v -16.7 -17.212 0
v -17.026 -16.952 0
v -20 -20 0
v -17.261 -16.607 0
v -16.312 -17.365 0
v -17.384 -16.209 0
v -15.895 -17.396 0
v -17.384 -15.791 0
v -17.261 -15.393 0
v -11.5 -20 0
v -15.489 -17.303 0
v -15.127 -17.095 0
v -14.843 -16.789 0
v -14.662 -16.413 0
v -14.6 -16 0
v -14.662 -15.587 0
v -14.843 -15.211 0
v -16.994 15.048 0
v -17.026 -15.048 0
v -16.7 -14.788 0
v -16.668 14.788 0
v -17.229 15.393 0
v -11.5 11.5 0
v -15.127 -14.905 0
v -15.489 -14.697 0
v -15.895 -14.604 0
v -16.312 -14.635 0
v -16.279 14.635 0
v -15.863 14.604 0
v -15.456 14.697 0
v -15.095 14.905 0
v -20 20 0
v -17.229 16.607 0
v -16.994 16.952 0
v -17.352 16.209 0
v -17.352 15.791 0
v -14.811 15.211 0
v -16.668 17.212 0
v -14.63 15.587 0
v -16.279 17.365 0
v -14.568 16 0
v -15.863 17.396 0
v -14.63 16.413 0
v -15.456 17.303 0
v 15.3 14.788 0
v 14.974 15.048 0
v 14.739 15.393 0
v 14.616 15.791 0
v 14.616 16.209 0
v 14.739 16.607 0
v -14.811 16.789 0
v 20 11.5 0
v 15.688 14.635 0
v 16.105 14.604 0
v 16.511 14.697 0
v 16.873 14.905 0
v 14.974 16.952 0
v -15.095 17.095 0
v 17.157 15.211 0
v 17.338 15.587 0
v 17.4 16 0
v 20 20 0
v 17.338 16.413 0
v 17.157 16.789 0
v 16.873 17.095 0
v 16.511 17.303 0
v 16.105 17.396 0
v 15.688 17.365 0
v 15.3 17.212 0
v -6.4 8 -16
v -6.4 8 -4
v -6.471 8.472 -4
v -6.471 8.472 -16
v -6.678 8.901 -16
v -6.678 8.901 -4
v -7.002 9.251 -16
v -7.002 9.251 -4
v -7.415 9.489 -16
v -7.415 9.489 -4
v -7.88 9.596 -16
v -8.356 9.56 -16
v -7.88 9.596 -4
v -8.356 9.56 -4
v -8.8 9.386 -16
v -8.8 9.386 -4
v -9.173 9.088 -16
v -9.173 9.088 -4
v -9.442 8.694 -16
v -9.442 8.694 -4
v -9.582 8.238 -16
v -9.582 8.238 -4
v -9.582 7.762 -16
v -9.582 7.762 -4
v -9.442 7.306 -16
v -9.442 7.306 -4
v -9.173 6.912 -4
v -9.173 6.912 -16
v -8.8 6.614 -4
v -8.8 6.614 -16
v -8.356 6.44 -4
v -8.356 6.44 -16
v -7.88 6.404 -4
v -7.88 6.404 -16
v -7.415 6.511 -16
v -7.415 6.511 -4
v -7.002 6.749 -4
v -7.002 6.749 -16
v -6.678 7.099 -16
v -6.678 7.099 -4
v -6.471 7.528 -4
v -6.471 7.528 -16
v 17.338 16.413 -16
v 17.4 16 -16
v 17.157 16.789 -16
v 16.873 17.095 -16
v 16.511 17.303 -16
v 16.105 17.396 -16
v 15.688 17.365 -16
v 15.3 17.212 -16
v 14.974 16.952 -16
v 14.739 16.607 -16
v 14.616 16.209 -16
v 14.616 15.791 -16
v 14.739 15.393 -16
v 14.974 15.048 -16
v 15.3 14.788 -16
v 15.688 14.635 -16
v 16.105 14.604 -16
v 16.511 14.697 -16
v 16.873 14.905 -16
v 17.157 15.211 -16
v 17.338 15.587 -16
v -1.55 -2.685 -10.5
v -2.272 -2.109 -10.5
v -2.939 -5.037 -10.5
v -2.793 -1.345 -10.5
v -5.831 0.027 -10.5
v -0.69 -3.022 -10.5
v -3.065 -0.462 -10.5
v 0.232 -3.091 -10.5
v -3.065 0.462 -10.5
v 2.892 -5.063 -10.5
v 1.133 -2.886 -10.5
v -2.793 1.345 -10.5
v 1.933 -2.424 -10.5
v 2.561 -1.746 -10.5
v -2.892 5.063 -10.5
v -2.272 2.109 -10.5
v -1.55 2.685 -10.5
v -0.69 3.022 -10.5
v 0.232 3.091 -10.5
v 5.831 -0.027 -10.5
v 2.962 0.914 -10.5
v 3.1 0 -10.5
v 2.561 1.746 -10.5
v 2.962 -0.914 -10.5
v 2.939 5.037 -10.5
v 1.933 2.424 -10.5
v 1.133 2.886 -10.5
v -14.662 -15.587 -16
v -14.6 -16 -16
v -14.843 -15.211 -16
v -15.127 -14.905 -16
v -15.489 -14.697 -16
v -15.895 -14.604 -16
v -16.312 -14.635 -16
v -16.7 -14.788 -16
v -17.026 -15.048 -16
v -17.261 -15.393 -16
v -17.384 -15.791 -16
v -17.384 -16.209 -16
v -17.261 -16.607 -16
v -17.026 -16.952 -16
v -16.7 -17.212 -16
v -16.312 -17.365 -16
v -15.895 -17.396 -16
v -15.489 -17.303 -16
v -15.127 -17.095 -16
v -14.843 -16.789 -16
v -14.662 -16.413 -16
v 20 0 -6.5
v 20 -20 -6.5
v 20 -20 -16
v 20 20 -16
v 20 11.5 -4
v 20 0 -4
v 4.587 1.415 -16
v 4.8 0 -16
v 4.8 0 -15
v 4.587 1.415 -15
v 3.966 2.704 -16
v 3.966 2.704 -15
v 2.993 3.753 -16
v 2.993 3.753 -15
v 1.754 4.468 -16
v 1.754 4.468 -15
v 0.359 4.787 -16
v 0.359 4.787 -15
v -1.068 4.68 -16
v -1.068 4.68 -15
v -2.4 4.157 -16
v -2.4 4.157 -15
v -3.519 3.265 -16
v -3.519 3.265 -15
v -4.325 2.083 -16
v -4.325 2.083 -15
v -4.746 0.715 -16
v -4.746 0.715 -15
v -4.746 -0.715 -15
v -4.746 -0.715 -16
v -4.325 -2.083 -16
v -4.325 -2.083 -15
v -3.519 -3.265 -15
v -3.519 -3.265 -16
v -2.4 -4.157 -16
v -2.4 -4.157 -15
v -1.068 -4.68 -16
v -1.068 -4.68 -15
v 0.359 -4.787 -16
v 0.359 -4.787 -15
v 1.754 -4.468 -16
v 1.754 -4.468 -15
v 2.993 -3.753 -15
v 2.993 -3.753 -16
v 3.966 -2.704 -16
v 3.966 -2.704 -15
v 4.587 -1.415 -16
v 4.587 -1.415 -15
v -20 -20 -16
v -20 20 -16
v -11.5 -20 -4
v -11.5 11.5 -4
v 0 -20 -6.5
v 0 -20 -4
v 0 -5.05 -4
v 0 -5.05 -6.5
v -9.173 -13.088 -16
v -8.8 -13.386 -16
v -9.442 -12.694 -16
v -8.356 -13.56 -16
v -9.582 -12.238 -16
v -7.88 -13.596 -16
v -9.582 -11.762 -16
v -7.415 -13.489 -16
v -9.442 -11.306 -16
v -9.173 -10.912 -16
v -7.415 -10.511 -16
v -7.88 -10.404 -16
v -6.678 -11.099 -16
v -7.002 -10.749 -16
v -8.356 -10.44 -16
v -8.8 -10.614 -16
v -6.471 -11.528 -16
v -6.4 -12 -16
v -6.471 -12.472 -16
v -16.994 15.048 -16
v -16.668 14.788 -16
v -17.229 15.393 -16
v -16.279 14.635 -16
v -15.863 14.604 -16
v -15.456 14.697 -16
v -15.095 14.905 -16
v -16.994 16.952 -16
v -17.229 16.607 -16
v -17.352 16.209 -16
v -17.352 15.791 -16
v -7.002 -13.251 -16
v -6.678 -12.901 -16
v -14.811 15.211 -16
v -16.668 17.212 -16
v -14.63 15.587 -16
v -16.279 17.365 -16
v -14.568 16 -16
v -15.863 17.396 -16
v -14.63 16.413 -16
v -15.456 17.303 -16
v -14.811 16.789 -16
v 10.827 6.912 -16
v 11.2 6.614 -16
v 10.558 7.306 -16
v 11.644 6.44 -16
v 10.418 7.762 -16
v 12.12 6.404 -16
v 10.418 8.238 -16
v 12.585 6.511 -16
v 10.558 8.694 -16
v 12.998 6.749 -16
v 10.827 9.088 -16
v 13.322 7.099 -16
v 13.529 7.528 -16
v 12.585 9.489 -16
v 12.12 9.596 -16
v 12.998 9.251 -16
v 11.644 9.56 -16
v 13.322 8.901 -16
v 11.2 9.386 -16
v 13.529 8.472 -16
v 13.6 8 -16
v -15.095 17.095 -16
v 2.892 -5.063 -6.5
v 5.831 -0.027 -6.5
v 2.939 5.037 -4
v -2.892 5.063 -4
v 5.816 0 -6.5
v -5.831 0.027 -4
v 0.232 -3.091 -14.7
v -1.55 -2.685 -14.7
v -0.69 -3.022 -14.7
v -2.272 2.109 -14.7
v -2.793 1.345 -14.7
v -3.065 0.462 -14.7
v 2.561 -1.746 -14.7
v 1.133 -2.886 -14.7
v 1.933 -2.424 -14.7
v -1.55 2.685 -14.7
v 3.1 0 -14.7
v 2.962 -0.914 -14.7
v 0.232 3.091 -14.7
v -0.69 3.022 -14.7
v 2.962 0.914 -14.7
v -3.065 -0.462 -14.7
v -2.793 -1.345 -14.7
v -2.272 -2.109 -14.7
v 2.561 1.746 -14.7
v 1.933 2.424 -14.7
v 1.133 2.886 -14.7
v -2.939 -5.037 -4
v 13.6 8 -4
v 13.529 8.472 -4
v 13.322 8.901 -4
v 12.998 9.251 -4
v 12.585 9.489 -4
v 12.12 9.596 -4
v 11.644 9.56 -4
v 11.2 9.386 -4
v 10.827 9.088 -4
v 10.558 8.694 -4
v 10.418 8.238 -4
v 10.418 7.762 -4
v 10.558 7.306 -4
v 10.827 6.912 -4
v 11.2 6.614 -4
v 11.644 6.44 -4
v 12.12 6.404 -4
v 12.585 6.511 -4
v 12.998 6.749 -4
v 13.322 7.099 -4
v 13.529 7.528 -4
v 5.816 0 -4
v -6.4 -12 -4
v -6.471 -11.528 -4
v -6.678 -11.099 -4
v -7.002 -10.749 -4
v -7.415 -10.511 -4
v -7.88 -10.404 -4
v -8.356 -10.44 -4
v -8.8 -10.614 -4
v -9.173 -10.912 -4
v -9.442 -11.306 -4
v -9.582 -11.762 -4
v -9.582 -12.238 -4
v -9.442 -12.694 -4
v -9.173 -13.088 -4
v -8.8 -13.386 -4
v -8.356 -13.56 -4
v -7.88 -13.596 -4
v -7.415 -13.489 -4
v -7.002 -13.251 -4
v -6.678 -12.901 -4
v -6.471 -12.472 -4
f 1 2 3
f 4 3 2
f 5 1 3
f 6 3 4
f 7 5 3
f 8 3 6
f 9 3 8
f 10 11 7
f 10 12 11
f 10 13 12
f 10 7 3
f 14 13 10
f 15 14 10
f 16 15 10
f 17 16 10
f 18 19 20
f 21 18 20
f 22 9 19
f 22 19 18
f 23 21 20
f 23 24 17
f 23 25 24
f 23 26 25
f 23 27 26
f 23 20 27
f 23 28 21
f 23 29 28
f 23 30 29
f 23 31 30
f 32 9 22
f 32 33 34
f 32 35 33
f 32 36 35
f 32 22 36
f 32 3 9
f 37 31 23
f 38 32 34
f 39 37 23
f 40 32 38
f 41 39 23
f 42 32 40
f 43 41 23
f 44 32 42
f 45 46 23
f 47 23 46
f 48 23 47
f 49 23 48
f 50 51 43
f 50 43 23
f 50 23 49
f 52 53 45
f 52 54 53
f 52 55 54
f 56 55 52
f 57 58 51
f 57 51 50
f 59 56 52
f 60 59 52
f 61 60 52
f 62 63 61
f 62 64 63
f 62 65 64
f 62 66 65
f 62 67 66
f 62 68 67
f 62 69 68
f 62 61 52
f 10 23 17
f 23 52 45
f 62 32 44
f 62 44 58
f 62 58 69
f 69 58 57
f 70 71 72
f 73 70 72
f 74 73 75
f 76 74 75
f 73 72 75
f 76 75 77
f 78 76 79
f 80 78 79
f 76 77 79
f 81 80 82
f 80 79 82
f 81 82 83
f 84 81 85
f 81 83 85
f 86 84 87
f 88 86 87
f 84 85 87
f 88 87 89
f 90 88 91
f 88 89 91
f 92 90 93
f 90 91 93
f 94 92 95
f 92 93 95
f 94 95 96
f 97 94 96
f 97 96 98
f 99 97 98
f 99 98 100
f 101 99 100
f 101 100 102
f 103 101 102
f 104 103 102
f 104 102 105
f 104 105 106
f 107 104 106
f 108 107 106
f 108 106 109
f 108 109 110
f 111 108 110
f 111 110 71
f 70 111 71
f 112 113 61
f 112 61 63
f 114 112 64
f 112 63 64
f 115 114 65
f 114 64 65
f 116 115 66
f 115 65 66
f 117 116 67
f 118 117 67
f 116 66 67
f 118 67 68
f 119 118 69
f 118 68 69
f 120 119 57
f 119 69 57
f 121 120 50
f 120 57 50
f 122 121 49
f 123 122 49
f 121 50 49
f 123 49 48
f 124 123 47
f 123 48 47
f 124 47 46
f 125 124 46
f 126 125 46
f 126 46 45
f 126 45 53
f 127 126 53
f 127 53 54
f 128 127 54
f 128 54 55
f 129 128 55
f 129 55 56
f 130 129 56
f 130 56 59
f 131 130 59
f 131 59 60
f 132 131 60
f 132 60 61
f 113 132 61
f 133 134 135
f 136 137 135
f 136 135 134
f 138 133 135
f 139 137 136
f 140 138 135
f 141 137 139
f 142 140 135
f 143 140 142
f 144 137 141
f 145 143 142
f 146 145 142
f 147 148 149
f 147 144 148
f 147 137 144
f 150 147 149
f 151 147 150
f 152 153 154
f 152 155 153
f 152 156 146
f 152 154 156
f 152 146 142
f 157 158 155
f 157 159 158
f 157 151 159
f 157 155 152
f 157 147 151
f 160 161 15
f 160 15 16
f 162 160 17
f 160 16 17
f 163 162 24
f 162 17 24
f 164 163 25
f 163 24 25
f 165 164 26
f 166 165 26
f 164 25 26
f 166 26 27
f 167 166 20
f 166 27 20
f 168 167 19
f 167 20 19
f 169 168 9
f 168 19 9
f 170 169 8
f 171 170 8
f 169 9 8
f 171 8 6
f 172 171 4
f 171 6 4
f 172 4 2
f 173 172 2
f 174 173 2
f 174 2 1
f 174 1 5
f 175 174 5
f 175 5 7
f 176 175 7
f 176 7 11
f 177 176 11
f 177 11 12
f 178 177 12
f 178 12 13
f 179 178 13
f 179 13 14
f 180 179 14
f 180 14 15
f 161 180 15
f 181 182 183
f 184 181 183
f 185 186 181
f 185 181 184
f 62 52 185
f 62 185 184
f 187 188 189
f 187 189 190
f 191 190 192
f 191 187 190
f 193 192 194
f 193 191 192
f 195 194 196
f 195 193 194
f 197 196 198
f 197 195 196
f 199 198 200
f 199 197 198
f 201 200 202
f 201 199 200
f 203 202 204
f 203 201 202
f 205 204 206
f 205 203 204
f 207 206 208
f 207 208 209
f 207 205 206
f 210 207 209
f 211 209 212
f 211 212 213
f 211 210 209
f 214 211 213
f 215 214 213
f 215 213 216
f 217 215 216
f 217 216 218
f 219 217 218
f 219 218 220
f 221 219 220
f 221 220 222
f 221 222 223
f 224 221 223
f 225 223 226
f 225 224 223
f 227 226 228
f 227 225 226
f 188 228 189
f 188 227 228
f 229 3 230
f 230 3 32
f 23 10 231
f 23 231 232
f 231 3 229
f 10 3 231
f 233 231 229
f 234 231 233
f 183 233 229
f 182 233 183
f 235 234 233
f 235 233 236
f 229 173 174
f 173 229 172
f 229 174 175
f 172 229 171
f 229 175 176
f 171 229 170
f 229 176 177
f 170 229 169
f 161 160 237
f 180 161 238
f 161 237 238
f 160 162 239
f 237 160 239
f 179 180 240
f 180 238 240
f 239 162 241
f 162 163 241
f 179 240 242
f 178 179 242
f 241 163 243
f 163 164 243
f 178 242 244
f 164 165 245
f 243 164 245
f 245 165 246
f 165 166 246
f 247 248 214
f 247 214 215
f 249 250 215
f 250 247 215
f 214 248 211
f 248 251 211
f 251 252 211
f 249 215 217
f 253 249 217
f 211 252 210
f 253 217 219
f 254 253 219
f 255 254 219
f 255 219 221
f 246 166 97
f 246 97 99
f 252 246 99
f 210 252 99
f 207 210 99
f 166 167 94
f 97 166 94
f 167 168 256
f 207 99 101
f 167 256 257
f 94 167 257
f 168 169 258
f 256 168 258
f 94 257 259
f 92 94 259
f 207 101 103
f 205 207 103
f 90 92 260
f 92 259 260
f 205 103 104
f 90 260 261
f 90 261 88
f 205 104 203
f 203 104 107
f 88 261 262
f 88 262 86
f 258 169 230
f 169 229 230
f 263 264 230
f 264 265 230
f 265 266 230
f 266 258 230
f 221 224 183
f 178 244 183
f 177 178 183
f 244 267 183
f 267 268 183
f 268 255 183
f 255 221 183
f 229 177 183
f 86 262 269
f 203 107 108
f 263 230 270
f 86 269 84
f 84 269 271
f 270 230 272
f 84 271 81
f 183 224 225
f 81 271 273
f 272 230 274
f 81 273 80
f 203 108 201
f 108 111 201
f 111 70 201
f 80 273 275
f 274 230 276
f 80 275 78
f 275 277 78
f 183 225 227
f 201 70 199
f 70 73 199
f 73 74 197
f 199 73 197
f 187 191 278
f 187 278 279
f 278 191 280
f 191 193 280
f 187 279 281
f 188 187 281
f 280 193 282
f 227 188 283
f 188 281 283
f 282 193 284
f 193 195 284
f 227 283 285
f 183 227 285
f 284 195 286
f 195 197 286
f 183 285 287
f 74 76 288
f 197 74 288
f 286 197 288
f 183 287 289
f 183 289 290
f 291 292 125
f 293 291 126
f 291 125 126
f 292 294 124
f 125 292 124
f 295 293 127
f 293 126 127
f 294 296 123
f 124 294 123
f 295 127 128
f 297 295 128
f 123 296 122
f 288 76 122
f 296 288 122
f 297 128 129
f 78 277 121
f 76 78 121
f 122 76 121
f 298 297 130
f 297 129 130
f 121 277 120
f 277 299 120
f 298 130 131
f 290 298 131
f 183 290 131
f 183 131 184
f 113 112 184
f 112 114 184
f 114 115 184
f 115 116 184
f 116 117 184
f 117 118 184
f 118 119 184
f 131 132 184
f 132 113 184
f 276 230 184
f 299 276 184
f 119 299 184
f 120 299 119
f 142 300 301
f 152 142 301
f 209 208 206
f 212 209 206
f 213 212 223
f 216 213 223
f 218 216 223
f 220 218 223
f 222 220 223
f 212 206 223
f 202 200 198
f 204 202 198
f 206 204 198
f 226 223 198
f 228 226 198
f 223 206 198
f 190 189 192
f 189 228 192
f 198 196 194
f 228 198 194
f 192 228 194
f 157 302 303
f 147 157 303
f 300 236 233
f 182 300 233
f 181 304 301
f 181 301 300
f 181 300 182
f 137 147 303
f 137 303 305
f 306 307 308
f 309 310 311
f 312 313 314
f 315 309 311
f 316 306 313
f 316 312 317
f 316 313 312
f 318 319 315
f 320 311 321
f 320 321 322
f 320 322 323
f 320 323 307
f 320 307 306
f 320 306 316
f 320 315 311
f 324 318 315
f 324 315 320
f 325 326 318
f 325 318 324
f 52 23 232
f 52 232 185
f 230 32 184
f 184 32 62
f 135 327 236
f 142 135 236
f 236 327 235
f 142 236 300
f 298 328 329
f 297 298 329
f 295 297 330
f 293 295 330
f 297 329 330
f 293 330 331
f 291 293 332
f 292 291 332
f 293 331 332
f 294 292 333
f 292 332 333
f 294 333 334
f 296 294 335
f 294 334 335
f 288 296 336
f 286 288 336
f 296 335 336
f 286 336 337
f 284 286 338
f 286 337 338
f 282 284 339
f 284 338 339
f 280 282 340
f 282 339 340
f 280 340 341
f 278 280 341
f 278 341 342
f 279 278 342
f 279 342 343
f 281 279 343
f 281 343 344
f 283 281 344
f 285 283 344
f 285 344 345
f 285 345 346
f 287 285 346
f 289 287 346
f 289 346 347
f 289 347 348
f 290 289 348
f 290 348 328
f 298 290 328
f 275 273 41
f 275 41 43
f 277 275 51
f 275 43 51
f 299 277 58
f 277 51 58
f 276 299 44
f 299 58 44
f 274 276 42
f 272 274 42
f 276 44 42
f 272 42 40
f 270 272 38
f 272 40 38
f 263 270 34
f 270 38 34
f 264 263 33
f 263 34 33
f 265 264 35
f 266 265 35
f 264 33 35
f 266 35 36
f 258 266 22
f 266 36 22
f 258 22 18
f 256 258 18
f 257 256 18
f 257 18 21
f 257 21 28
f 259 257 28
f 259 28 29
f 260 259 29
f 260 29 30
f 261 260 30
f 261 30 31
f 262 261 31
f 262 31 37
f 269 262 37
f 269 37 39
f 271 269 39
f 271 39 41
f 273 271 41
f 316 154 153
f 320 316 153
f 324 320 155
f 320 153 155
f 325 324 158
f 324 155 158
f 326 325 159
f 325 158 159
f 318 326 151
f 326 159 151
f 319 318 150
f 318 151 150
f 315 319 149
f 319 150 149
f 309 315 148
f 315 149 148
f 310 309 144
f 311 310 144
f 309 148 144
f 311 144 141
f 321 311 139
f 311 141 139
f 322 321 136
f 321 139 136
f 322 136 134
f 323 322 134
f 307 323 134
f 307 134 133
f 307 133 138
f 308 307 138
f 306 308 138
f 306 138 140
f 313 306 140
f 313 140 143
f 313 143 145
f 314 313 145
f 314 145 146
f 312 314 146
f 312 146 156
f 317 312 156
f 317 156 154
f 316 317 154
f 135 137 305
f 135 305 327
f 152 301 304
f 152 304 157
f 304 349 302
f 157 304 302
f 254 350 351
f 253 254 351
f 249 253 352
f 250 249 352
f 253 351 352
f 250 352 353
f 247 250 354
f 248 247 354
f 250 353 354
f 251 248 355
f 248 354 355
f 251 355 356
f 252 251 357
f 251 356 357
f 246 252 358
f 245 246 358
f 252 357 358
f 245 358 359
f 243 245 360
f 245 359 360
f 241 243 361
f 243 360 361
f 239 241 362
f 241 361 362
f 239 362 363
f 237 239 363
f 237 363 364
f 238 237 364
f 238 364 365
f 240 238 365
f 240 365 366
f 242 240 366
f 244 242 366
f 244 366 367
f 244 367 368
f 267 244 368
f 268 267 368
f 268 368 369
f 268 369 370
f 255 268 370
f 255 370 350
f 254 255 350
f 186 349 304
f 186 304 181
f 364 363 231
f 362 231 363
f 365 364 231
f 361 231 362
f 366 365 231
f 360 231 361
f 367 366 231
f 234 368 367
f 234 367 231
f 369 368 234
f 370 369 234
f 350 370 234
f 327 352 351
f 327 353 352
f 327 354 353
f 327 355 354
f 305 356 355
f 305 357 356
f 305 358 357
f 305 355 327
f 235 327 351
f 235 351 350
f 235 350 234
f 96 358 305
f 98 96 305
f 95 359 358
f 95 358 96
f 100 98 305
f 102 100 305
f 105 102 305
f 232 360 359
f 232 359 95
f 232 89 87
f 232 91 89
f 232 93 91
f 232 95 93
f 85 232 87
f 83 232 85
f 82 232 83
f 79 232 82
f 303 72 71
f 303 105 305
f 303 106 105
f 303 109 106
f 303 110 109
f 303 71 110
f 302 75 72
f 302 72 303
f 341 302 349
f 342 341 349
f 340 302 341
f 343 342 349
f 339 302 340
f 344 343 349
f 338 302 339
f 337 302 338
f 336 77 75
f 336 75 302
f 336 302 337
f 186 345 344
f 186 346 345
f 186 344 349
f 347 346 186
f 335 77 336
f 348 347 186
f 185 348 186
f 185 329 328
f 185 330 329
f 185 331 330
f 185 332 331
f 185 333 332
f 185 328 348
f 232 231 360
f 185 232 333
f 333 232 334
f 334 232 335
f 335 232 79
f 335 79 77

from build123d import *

# Parameters (mm, degrees)
F0_W      = 40
F0_H      = 40
F1_DEPTH  = 16
F2_R      = 3.1
F3_DEPTH  = 14.7
F4_W      = 31.5
F4_H      = 31.5
F5_DEPTH  = 4
F8_DEPTH  = 7
F9_W      = 20
F9_H      = 20
F10_DEPTH = 3
F11_R     = 1.6
F12_DEPTH = 25
F14_R     = 4.8
F15_DEPTH = 1
F16_R     = 1.4
F17_DEPTH = 25


with BuildPart() as f1:
    # F0 (on Top) → F1 (new body)
    with BuildSketch(Plane.XY):
        Rectangle(F0_W, F0_H)
    extrude(amount=-F1_DEPTH)

    # F2 (on Top) → F3 (cut)
    with BuildSketch(Plane.XY):
        Circle(F2_R)
    extrude(amount=-F3_DEPTH, mode=Mode.SUBTRACT)

    # F4 (on Top) → F5 (cut)
    with BuildSketch(Plane.XY):
        with Locations((4.25, -4.25)):
            Rectangle(F4_W, F4_H)
    extrude(amount=-F5_DEPTH, mode=Mode.SUBTRACT)

    # F7 (on offset) → F8 (cut)
    with BuildSketch(Plane.XY.offset(-3.5)):
        Polygon((5.831176, -0.026889), (2.938874, 5.036502), (-2.892302, 5.063391), (-5.831176, 0.026889), (-2.938874, -5.036502), (2.892302, -5.063391), align=None)
    extrude(amount=-F8_DEPTH, mode=Mode.SUBTRACT)

    # F9 (on offset) → F10 (cut)
    with BuildSketch(Plane.XY.offset(-3.5)):
        with Locations((10, -10)):
            Rectangle(F9_W, F9_H)
    extrude(amount=-F10_DEPTH, mode=Mode.SUBTRACT)

    # F11 (on offset) → F12 (cut)
    with BuildSketch(Plane.XY.offset(-3.5)):
        with Locations((-8, 8)):
            Circle(F11_R)
        with Locations((12, 8)):
            Circle(F11_R)
        with Locations((-8, -12)):
            Circle(F11_R)
    extrude(amount=-F12_DEPTH, mode=Mode.SUBTRACT)

    # F14 (on offset) → F15 (cut)
    with BuildSketch(Plane.XY.offset(-16)):
        Circle(F14_R)
    extrude(amount=F15_DEPTH, mode=Mode.SUBTRACT)

    # F16 (on Top) → F17 (cut)
    with BuildSketch(Plane.XY):
        with Locations((-15.967699, 16)):
            Circle(F16_R)
        with Locations((16, 16)):
            Circle(F16_R)
        with Locations((-16, -16)):
            Circle(F16_R)
    extrude(amount=-F17_DEPTH, mode=Mode.SUBTRACT)


solid = f1.part
